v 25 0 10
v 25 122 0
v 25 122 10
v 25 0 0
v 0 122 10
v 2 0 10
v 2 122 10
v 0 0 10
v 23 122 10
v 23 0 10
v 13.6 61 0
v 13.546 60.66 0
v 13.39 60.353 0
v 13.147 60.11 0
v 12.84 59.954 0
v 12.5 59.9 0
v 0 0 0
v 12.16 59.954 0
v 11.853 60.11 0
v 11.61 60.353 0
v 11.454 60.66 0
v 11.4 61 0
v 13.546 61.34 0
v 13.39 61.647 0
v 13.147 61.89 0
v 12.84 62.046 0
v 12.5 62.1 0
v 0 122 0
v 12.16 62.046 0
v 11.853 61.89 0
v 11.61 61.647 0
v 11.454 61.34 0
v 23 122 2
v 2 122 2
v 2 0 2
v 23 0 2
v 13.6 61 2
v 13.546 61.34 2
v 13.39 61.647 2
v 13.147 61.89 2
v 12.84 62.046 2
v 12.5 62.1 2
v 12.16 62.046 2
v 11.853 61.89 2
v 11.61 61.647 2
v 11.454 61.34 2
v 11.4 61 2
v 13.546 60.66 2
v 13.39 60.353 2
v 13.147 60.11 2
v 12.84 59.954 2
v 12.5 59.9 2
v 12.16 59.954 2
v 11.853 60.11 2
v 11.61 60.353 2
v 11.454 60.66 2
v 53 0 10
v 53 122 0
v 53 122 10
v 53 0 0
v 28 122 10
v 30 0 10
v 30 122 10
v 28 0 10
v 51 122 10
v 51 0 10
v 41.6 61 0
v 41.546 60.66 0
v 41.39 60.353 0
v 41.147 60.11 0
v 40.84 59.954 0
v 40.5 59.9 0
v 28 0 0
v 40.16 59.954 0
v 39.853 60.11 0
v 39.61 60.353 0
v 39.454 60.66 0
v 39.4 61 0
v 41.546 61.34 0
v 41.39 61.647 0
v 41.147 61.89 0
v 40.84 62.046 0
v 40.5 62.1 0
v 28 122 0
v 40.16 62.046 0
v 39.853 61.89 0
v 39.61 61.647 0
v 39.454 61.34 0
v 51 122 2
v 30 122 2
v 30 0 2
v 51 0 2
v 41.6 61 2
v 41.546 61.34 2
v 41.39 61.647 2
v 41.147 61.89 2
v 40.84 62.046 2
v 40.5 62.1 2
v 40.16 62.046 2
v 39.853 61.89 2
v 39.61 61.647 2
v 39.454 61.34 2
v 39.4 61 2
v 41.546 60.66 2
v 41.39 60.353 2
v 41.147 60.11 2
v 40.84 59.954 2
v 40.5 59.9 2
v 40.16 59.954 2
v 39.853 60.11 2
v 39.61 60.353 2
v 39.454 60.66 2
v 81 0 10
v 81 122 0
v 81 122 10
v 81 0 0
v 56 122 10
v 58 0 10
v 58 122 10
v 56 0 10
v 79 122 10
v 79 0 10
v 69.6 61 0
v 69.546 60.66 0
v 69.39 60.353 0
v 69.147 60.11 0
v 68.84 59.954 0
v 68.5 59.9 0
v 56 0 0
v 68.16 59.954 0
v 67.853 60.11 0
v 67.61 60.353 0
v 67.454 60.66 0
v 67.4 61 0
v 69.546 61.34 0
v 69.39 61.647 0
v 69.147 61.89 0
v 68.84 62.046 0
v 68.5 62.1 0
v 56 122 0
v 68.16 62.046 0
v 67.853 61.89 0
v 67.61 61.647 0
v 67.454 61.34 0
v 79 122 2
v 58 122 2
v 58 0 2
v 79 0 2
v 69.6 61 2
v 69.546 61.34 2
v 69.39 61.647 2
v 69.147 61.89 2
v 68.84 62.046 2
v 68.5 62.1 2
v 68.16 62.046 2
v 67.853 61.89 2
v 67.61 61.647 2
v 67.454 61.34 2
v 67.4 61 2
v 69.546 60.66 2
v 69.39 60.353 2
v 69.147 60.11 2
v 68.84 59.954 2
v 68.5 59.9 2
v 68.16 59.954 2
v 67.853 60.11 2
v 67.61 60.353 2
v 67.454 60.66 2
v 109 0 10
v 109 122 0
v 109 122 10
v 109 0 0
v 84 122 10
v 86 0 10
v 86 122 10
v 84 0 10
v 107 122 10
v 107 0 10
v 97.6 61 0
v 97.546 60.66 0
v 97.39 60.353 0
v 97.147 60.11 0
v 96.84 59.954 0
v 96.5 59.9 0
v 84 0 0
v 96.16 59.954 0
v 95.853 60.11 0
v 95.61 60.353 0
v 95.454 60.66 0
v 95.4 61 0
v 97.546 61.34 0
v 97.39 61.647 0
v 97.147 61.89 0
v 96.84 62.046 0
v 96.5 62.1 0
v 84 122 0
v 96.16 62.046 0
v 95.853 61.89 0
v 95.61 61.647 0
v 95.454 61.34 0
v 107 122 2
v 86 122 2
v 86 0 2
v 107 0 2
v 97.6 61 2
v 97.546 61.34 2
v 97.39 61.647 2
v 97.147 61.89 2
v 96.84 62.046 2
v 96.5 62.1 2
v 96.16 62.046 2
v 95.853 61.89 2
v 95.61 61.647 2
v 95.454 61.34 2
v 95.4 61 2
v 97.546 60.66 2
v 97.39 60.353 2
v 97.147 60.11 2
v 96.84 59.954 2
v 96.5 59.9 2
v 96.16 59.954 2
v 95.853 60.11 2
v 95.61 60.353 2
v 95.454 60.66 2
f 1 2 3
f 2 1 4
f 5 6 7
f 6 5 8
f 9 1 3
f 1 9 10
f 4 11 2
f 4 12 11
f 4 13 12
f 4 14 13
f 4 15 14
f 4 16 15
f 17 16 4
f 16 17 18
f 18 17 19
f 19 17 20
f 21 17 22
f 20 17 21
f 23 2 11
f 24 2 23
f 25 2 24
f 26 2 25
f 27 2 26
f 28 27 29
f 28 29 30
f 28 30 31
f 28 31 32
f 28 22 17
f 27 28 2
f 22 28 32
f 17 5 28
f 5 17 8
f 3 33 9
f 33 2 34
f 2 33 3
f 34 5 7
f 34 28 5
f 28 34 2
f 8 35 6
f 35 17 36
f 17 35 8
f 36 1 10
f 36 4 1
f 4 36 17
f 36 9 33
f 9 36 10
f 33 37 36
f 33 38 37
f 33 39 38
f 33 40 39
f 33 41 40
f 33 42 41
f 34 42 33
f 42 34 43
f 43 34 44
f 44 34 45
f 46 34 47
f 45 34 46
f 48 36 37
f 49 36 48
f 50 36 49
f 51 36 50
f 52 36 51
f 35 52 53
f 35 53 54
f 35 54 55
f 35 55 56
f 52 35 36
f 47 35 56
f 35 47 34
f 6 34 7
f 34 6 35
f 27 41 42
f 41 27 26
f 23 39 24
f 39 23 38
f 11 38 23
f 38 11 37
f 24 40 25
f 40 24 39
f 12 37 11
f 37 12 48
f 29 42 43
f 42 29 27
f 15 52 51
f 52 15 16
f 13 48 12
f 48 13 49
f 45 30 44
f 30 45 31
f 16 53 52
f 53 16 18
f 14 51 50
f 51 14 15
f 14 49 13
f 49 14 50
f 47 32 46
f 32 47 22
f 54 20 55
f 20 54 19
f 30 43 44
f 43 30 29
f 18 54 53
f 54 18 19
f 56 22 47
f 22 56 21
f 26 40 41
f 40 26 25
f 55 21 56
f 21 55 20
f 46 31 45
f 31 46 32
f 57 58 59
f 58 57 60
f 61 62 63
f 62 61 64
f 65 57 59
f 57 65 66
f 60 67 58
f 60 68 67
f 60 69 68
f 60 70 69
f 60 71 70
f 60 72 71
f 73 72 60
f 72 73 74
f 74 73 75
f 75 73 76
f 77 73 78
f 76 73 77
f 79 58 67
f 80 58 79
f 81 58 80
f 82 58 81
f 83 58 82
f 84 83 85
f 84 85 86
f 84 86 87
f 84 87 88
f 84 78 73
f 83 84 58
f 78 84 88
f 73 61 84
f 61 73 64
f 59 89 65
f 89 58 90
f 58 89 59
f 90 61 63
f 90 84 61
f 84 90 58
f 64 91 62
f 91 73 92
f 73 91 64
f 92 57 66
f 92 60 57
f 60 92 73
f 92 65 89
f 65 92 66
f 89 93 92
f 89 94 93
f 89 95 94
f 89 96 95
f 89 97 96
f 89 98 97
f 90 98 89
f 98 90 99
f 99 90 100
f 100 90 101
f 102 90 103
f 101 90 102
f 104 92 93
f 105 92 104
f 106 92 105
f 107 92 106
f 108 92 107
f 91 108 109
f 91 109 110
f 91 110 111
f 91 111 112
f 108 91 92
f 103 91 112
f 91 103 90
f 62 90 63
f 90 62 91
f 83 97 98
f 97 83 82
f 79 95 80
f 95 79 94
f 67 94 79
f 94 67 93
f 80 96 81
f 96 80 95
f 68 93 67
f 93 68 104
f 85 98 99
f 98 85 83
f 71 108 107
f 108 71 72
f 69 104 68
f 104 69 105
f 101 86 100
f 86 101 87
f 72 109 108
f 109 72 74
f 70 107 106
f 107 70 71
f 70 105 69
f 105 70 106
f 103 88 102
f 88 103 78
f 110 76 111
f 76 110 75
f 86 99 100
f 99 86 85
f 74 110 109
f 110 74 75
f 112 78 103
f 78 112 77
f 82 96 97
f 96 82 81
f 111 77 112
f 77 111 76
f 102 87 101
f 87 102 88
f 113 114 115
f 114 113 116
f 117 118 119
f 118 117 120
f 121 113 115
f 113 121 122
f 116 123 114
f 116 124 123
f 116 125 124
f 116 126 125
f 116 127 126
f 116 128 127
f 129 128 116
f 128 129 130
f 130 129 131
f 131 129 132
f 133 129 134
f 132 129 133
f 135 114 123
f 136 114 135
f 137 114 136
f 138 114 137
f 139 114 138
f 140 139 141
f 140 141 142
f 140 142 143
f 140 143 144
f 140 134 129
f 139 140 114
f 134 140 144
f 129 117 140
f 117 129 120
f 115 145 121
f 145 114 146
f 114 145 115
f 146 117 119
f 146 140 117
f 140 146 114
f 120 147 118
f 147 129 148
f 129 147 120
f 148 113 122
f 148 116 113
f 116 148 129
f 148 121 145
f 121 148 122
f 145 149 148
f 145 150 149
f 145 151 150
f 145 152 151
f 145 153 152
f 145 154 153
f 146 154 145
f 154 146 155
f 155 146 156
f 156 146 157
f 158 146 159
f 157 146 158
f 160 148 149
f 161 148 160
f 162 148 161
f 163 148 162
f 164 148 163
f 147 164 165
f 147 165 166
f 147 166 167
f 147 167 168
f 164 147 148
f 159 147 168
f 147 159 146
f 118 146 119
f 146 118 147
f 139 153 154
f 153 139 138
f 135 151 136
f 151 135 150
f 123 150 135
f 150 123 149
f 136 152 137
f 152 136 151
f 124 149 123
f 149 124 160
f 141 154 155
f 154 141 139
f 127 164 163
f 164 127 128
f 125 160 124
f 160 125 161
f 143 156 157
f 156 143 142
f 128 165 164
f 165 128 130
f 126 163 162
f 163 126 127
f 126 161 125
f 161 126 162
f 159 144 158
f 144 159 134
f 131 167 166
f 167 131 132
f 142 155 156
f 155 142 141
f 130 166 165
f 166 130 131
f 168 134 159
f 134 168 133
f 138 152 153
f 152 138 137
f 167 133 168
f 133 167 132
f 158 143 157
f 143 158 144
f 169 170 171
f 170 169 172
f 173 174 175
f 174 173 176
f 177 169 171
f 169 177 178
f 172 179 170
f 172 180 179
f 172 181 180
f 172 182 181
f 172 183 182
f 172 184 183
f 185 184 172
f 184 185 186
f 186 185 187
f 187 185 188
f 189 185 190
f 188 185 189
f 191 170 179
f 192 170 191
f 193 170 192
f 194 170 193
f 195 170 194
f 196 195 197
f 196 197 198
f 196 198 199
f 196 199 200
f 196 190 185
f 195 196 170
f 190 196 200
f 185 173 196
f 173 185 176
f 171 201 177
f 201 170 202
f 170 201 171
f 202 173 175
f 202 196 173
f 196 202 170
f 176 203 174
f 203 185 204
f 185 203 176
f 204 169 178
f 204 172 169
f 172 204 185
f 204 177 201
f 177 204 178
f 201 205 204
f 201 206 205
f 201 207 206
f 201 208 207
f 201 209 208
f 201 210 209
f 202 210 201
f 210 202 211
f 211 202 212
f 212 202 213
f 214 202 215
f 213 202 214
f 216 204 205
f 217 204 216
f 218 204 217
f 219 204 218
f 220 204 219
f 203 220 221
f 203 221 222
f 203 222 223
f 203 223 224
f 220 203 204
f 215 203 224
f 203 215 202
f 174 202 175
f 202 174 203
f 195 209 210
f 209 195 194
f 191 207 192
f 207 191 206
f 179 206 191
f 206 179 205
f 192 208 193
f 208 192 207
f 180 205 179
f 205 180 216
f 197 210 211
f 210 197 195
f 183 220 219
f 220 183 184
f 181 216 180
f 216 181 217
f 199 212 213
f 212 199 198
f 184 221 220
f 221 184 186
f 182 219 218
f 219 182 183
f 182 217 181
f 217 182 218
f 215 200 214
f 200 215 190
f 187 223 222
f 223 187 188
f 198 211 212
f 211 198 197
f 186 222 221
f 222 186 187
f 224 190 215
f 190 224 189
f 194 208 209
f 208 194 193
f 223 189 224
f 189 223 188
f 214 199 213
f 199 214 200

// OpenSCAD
// ============================================================
// PRINT: TRILHOS GM CABINE (Posição 2 — X=75mm)
// 4 peças idênticas — canal 21mm (filtro 20mm + folga)
// Mesa: 112mm × 122mm — cabe na Ender 3 (200×200mm) ✓
// Tempo estimado: ~1h20
// ============================================================
// 1 filtro × 2 laterais × 2 metades = 4 peças
// ============================================================

use <TRILHO_FILTRO.scad>

gap = 3;
canal = 21;
largura = canal + 2*2; // 25mm

// 4 peças lado a lado em X
for (i = [0:3]) {
    translate([i * (largura + gap), 0, 0])
        trilho_metade_a(canal);
}

// Guia visual da mesa (não imprime)
%translate([0, 0, -0.5])
    cube([200, 200, 0.1]);
